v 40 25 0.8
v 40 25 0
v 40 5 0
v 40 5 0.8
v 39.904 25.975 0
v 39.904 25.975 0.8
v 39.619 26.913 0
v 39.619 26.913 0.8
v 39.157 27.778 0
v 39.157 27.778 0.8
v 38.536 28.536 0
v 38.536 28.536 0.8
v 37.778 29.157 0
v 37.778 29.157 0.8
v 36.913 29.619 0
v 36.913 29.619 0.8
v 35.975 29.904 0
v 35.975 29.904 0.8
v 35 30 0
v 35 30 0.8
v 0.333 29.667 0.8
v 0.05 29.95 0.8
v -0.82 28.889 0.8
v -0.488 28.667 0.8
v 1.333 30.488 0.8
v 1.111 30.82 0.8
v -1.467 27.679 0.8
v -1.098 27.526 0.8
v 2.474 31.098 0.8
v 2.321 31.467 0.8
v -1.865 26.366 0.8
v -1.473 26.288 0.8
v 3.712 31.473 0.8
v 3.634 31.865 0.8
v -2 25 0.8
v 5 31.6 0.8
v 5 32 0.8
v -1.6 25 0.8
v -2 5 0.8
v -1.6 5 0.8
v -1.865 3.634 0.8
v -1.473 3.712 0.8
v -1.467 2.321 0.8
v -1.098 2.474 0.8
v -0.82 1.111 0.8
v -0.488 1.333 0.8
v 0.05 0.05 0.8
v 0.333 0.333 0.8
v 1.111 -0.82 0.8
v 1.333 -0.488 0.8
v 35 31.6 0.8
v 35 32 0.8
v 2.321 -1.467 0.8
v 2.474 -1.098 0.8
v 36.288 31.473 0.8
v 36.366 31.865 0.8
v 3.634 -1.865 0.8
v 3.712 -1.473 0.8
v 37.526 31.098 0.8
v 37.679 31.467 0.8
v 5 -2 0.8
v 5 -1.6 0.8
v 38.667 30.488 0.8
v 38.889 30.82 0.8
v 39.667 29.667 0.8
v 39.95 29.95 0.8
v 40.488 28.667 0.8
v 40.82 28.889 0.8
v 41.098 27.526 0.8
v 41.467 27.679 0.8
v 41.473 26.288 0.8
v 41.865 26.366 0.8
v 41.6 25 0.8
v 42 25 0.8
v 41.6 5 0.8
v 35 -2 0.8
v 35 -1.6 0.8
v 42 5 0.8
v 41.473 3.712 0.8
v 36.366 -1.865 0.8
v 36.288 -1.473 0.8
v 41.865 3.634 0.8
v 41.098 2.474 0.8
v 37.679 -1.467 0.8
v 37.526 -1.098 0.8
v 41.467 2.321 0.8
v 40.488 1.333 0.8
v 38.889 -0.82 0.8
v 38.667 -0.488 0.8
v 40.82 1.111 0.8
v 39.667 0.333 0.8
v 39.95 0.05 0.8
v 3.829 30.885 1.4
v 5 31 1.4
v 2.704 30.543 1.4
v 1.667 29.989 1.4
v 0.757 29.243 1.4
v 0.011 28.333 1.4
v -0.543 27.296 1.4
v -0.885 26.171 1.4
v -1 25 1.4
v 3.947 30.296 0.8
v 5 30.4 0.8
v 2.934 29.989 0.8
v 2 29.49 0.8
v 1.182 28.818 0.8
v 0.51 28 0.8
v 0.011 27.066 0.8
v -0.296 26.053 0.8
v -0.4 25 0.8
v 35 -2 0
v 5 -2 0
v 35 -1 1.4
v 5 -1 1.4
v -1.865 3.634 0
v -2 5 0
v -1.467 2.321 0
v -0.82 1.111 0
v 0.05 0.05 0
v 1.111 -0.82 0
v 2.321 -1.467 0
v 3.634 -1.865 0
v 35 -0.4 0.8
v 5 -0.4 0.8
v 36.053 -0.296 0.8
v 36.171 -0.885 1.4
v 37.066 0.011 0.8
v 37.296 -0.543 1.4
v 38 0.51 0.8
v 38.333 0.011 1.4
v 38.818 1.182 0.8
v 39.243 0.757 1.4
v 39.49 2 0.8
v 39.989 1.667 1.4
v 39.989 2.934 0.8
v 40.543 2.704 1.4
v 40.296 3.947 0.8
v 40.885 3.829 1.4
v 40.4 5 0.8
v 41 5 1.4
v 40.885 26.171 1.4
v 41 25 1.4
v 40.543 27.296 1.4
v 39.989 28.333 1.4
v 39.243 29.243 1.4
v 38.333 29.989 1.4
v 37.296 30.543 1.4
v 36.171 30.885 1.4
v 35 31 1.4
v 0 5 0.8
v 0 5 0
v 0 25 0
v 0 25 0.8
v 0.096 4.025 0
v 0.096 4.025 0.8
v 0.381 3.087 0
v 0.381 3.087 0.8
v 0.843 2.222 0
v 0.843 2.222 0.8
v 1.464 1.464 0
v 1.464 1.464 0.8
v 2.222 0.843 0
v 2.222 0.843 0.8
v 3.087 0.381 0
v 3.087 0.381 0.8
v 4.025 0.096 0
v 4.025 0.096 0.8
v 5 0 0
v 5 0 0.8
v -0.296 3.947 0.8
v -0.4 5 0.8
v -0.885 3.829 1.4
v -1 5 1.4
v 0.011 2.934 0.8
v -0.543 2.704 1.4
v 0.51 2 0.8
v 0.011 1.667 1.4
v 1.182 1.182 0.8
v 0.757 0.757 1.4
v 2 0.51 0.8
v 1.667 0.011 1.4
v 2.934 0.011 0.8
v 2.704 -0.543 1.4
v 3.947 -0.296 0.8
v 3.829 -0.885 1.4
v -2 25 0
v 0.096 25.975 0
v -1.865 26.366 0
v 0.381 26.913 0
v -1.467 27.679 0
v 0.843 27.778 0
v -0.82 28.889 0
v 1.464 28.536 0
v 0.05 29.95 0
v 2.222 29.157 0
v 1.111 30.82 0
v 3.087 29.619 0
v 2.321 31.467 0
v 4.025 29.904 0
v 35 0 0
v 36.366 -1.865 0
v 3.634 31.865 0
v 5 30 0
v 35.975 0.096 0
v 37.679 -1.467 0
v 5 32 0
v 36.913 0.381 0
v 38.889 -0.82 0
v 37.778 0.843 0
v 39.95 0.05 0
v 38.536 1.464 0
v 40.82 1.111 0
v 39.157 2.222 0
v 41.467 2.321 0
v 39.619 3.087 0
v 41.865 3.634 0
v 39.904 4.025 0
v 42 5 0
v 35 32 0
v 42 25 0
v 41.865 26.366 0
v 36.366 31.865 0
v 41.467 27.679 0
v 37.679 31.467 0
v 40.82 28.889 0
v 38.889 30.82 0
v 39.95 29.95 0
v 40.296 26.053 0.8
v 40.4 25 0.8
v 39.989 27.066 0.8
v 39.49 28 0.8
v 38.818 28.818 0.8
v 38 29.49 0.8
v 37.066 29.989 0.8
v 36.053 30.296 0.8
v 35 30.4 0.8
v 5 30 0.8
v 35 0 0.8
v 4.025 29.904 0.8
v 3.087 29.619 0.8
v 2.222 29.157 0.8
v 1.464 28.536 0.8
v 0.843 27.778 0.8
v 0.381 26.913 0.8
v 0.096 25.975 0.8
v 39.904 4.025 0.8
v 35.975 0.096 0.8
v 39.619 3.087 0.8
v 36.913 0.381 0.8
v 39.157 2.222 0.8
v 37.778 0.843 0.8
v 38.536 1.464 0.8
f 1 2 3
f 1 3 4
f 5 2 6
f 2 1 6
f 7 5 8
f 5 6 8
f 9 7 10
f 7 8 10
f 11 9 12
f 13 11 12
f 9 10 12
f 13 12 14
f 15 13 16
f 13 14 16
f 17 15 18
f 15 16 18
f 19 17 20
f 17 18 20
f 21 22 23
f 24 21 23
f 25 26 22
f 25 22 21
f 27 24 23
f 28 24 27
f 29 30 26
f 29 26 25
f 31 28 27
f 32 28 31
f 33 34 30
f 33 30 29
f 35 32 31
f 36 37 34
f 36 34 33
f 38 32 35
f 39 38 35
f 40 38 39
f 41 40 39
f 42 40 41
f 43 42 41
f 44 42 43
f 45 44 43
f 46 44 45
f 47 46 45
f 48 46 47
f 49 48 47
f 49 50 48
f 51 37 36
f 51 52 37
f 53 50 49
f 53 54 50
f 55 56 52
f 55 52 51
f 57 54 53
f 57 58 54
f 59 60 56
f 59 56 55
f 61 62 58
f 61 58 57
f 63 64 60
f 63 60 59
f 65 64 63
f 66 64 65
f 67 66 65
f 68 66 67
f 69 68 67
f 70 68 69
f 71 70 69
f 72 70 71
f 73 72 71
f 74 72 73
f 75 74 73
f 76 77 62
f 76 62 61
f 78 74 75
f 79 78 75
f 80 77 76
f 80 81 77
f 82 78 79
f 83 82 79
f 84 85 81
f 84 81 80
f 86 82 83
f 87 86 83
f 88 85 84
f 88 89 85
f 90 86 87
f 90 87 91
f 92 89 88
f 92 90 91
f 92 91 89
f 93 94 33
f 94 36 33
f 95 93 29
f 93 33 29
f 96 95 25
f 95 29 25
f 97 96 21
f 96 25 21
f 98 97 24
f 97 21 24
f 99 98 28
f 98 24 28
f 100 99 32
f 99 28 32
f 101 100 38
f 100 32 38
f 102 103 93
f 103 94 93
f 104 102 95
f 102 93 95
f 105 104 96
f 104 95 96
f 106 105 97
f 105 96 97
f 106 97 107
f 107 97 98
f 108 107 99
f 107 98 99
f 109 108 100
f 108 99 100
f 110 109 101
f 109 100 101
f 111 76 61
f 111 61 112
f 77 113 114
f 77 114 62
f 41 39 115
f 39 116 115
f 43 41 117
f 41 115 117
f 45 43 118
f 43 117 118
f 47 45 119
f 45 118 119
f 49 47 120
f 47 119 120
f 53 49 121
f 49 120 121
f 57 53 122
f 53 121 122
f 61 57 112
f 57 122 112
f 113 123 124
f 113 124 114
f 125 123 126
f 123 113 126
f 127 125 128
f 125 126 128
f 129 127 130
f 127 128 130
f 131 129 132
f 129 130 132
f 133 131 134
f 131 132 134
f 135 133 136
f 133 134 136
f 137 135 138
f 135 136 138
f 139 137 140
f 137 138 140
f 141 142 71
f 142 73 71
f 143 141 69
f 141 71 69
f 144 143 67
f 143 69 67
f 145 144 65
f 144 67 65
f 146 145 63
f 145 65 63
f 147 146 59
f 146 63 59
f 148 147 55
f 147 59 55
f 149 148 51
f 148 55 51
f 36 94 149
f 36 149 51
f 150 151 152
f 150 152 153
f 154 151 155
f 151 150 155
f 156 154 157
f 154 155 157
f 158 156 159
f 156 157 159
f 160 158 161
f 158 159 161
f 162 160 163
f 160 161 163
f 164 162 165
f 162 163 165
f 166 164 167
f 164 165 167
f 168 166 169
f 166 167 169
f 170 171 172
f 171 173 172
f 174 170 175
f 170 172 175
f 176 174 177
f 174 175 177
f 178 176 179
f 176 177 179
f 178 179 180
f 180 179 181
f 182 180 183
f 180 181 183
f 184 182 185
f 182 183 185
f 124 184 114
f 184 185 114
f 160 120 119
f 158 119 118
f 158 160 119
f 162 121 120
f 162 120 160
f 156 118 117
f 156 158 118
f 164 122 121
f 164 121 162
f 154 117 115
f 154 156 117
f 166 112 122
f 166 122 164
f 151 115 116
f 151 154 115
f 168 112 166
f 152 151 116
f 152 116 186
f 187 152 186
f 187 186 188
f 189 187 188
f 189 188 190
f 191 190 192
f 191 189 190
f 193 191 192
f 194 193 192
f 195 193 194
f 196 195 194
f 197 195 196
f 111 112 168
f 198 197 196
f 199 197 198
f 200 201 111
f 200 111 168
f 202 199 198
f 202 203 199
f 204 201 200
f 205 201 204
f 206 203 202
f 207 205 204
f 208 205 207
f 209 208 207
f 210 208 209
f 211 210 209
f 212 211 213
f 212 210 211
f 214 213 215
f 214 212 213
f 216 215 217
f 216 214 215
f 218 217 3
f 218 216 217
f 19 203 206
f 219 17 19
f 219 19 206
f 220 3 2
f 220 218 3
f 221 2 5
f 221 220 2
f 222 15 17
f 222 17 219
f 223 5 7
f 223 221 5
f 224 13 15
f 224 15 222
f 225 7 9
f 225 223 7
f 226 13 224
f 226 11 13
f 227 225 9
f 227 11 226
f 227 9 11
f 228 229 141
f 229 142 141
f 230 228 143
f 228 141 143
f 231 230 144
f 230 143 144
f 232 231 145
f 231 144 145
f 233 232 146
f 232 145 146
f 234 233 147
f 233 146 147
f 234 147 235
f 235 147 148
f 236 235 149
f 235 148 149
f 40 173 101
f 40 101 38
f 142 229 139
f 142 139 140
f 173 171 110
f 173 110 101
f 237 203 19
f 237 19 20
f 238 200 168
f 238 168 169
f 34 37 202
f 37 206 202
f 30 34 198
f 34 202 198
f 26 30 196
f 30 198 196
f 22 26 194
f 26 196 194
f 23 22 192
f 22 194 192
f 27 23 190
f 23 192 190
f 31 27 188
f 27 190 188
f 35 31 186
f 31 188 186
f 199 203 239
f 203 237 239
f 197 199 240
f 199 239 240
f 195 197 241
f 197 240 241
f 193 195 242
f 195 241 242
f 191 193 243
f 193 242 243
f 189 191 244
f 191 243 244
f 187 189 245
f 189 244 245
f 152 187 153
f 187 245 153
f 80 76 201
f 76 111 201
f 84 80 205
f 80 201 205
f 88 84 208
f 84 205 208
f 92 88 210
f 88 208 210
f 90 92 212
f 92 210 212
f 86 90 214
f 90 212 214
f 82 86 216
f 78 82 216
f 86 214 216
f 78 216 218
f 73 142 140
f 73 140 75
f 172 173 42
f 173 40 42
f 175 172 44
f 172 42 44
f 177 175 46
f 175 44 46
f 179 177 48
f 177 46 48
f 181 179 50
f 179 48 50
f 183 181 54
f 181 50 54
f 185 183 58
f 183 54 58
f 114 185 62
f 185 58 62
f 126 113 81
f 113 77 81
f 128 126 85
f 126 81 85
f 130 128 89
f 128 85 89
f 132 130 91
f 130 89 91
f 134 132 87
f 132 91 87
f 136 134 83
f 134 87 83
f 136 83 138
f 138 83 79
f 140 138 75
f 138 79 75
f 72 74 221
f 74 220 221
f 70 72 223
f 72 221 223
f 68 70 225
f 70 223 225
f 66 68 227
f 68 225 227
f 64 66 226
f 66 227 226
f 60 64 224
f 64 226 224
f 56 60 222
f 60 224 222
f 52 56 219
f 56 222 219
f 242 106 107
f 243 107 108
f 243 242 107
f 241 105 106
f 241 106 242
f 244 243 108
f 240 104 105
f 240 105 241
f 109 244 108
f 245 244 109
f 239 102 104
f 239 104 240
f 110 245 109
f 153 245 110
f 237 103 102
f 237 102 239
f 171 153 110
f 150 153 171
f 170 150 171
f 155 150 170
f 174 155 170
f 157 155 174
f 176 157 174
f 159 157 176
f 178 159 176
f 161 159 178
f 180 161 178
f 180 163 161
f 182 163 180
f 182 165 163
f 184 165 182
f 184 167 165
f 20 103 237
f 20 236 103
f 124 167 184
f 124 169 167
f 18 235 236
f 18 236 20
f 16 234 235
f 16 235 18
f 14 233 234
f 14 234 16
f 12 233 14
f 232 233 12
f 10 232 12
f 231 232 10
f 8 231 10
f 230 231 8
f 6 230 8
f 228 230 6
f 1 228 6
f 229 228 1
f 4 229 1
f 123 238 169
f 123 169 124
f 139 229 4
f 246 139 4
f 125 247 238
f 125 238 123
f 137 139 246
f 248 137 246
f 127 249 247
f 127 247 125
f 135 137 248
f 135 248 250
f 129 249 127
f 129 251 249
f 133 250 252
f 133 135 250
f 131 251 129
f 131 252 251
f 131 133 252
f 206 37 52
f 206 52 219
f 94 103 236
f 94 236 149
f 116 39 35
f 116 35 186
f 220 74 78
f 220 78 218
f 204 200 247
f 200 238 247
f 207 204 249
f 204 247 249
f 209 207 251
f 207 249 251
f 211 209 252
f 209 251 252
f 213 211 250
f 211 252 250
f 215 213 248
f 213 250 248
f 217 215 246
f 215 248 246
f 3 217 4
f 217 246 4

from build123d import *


with BuildPart() as f4:
    # F4: sweep along a path in F0
    with BuildLine(Plane.XY) as f4_path:
        Line((5, 0), (35, 0))
        ThreePointArc((35, 0), (38.5355339059, 1.4644660941), (40, 5))
        Line((40, 5), (40, 25))
        ThreePointArc((40, 25), (38.5355339059, 28.5355339059), (35, 30))
        Line((35, 30), (5, 30))
        ThreePointArc((5, 30), (1.4644660941, 28.5355339059), (0, 25))
        Line((0, 25), (0, 5))
        ThreePointArc((0, 5), (1.4644660941, 1.4644660941), (5, 0))
    # F3 (on line) → F4 (sweep)
    with BuildSketch(Plane.YZ.offset(20)):
        Polygon((-2, 0), (0, 0), (0, 0.8), (-0.4, 0.8), (-1, 1.4), (-1.6, 0.8), (-2, 0.8), align=None)
    sweep(path=f4_path.line)


solid = f4.part
